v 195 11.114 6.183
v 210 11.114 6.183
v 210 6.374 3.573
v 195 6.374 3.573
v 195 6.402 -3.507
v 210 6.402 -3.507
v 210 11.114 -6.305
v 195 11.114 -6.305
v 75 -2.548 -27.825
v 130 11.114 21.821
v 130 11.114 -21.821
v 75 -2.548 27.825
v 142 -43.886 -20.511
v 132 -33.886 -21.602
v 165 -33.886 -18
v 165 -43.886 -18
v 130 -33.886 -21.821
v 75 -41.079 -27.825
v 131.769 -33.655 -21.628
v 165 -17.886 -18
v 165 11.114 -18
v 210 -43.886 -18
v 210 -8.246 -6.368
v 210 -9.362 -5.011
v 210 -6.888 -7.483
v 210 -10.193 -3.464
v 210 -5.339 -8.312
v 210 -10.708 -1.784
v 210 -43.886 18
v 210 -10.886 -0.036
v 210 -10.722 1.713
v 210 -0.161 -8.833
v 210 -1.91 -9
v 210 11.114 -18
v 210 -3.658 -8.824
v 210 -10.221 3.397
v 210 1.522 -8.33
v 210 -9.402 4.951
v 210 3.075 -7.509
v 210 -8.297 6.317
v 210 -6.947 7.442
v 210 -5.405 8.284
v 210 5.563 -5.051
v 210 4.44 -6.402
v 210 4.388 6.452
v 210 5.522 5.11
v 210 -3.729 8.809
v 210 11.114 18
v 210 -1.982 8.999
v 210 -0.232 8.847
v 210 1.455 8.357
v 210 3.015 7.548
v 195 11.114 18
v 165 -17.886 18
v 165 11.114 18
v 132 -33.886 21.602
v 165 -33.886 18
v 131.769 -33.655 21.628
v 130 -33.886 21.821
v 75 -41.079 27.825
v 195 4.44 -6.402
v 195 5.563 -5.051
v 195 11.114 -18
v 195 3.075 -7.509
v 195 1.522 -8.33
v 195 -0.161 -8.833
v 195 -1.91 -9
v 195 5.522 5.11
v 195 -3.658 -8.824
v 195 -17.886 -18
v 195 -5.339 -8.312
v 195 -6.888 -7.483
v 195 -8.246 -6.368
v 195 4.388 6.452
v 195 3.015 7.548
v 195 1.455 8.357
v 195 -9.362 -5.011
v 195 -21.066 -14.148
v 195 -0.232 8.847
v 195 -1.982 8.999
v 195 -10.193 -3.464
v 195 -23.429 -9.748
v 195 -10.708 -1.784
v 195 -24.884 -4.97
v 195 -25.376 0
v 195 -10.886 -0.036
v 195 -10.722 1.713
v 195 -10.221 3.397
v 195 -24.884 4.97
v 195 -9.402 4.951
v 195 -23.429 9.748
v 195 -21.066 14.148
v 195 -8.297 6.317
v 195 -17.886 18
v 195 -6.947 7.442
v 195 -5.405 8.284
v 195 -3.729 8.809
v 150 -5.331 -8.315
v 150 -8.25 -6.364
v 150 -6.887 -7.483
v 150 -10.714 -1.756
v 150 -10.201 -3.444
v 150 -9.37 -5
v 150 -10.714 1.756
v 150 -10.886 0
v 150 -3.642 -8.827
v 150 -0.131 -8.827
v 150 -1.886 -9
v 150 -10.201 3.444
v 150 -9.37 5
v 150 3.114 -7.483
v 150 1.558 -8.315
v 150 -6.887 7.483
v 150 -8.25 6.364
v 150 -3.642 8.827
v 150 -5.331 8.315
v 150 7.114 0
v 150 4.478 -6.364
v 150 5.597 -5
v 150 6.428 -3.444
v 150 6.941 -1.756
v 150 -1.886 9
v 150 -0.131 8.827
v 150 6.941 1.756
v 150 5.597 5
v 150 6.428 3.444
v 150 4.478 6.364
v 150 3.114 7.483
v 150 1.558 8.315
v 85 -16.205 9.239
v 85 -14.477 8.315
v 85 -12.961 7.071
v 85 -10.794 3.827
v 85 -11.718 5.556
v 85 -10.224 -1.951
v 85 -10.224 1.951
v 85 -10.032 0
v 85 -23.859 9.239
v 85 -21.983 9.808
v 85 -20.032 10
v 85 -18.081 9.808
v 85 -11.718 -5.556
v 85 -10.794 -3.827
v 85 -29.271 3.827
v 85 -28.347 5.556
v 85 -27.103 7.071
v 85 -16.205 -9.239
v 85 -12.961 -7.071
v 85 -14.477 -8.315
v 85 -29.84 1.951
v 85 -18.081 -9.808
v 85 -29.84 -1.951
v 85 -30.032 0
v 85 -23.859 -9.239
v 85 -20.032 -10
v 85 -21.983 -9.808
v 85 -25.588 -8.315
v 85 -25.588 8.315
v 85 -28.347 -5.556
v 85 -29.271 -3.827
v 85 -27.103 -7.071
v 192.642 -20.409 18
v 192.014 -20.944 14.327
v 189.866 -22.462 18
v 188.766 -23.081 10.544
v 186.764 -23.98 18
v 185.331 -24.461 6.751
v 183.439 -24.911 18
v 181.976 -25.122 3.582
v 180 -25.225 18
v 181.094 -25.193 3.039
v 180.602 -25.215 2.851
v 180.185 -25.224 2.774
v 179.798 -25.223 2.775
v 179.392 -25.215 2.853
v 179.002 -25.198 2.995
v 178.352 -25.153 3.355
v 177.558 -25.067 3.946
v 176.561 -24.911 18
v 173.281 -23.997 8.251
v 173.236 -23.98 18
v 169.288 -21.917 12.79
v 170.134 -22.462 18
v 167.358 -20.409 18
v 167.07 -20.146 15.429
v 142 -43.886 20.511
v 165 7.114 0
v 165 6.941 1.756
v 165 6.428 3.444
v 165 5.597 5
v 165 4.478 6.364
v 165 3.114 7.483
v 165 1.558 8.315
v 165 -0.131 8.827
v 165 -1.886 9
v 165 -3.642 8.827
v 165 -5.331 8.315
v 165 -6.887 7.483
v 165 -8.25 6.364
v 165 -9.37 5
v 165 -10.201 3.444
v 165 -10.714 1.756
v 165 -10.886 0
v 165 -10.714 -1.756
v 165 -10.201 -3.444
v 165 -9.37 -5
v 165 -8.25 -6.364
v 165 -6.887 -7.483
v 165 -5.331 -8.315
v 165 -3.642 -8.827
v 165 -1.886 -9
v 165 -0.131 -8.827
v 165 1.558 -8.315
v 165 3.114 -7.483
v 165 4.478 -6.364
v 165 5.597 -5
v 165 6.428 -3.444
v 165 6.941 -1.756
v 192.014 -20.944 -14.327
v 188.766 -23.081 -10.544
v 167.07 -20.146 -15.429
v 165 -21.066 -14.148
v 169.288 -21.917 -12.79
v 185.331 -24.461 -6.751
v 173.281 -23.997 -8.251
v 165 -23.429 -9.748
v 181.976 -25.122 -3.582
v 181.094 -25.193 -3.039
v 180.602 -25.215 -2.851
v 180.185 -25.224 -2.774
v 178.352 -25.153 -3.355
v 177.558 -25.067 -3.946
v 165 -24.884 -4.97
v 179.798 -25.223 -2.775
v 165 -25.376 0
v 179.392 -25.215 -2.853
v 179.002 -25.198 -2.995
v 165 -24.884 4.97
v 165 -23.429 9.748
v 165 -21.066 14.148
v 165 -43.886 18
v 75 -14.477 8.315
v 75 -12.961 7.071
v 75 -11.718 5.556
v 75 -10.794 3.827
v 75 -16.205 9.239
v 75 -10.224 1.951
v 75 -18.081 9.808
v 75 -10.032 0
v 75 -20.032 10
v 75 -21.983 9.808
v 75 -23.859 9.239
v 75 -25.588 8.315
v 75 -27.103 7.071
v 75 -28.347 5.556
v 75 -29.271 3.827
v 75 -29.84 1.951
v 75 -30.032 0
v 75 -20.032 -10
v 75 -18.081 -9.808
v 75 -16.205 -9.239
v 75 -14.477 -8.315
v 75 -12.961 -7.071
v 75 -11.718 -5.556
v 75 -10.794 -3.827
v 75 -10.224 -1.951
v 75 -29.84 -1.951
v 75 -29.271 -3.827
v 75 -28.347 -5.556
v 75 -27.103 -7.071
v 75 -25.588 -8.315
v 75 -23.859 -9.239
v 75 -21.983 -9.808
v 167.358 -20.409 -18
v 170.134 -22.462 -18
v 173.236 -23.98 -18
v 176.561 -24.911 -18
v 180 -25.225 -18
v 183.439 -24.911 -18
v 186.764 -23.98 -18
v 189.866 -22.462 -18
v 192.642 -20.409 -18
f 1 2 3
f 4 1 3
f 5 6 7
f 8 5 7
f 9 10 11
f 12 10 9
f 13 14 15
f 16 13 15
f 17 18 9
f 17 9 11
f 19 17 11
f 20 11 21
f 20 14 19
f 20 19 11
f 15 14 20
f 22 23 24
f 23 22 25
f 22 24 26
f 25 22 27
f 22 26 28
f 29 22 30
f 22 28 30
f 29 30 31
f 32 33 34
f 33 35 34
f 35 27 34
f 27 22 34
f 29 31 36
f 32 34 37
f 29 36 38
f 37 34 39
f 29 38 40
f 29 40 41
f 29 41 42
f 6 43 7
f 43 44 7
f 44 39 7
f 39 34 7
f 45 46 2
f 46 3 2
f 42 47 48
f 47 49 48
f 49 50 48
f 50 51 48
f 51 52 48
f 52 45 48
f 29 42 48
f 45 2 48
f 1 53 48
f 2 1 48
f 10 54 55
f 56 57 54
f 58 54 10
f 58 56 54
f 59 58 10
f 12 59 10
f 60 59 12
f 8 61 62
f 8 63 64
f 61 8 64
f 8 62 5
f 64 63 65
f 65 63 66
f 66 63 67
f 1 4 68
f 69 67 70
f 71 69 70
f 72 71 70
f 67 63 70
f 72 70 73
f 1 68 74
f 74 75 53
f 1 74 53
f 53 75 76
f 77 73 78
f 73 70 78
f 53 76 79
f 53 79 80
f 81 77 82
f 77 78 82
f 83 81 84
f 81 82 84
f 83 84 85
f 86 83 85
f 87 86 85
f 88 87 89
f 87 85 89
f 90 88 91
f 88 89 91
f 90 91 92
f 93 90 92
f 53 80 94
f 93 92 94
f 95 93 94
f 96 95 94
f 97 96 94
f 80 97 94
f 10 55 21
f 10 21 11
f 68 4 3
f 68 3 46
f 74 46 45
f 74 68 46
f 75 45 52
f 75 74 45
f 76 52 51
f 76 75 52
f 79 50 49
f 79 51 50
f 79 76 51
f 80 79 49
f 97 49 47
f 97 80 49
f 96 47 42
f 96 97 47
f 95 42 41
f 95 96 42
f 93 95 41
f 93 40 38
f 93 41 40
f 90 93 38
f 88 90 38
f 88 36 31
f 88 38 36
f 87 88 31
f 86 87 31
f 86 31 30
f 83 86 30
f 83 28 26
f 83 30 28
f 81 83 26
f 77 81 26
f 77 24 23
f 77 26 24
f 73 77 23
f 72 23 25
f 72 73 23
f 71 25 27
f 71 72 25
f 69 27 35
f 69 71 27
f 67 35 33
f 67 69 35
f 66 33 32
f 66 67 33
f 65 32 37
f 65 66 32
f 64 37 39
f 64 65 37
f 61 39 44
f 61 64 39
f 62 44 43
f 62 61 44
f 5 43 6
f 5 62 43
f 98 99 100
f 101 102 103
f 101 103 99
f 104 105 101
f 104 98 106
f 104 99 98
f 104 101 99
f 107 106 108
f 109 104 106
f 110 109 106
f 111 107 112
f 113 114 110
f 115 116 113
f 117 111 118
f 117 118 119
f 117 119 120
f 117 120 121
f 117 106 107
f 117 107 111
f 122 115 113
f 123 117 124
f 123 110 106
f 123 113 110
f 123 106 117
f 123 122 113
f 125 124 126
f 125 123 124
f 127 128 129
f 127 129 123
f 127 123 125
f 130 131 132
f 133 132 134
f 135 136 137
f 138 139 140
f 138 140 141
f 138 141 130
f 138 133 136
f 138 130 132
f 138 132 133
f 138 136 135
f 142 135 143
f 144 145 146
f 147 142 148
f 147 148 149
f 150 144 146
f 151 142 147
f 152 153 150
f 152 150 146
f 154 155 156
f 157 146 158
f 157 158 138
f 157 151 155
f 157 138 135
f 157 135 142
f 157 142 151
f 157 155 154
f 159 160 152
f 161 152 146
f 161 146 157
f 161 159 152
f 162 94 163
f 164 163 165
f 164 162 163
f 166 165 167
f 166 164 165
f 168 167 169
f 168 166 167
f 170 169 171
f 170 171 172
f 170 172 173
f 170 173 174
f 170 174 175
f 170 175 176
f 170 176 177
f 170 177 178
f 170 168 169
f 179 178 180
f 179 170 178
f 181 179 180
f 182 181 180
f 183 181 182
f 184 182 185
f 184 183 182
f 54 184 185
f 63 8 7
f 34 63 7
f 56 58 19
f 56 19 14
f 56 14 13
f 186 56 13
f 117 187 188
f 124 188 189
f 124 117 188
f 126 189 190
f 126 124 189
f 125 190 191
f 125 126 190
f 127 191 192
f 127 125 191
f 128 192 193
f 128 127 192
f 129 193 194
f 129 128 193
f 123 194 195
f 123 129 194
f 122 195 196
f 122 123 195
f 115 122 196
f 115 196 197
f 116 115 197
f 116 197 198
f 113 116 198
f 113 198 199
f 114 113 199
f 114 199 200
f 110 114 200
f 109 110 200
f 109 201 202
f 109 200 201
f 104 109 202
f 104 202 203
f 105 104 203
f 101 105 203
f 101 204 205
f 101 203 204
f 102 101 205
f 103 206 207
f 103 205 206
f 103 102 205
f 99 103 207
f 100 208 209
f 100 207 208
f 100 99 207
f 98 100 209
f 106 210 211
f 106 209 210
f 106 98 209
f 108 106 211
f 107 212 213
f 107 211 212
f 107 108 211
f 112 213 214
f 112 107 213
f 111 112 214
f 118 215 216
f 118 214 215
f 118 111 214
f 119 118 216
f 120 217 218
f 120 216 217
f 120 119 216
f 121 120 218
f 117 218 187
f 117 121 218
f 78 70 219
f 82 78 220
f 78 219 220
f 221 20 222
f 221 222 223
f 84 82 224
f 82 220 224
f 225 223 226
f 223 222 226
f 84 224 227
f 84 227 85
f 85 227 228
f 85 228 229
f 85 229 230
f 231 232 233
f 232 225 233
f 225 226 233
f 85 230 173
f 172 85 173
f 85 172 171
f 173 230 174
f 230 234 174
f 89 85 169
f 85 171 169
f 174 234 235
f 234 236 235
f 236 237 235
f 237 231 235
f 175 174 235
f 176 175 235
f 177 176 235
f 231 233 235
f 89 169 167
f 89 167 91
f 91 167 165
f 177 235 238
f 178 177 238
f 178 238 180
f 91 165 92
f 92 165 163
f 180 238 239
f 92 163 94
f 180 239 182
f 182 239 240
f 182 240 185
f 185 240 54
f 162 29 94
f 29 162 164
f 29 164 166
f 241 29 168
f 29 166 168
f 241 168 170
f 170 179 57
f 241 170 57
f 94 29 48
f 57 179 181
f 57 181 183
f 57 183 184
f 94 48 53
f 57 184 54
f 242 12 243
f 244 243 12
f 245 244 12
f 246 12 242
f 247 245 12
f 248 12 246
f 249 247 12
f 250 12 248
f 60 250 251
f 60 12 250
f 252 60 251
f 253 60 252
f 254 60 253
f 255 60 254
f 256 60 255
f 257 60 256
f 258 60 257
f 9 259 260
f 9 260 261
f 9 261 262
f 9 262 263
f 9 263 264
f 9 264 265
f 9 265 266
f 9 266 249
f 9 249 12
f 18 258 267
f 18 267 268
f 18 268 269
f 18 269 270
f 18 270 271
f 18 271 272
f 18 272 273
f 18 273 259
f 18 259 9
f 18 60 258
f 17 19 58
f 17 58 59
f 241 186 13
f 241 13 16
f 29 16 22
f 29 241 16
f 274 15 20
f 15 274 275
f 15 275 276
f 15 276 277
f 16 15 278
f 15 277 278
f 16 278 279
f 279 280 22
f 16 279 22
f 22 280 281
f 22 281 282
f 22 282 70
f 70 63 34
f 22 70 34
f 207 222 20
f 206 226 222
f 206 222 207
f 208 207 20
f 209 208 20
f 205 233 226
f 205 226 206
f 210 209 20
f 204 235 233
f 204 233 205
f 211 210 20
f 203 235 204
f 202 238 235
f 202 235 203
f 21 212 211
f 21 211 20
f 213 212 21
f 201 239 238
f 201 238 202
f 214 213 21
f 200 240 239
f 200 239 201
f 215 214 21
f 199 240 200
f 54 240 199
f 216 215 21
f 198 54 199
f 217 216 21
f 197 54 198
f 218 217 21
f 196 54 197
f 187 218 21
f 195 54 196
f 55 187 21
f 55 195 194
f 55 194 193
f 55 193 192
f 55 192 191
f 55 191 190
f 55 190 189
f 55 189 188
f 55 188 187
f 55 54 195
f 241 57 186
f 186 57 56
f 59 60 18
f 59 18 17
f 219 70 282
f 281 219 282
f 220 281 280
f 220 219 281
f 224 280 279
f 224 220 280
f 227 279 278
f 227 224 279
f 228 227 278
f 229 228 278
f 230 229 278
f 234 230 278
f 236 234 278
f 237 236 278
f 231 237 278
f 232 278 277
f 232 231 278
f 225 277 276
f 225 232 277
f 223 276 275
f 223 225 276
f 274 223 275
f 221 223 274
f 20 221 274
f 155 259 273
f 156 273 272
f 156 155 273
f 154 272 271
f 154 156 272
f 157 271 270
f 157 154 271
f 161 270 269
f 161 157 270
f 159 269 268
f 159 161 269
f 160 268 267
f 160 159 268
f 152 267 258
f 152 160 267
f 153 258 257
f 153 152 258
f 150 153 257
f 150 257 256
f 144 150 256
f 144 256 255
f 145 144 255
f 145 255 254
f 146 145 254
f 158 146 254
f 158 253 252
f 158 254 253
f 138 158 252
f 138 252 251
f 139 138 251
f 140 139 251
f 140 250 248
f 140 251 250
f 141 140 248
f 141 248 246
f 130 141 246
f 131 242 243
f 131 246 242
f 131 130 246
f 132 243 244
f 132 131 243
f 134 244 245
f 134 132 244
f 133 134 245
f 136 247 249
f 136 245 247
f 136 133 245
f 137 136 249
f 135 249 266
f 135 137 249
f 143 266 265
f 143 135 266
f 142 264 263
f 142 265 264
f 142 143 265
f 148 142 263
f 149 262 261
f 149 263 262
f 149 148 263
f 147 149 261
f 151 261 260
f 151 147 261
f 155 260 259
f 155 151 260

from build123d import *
from OCP.BRepAlgoAPI import BRepAlgoAPI_Cut
from OCP.TopTools import TopTools_ListOfShape

# Parameters (mm, degrees)
SKETCH1_R               = 10
BOSS_EXTRUDE2_DEPTH     = 30
SKETCH4_R               = 10
CUT_EXTRUDE1_DEPTH      = 15
CHAMFER1_SIZE           = 20
CUT_EXTRUDE2_DEPTH      = 174.638139858
CUT_EXTRUDE2_DEPTH_BACK = 174.638139858
BOSS_EXTRUDE3_DEPTH     = 45
CUT_EXTRUDE3_DEPTH      = 198.547978004
CUT_EXTRUDE3_DEPTH_BACK = 15
SKETCH6_3_R             = 9
SKETCH8_W               = 15
SKETCH8_H               = 36
BOSS_EXTRUDE4_DEPTH     = 45.000002
SKETCH10_R              = 9
CUT_EXTRUDE4_DEPTH      = 198.547978004
BOSS_EXTRUDE5_DEPTH     = 10
CHAMFER2_SIZE           = 12
CUT_EXTRUDE5_DEPTH      = 40
CUT_EXTRUDE6_DEPTH      = 217.852953896
CUT_EXTRUDE6_DEPTH_BACK = 217.852953896
SKETCH14_W              = 100
SKETCH14_H              = 60
CUT_EXTRUDE7_DEPTH      = 145.655593904
CUT_EXTRUDE7_DEPTH_BACK = 10
SKETCH16_R              = 10
CUT_EXTRUDE8_DEPTH      = 15


# Some blends are built 0.0001 mm under size
with BuildPart() as part:
    # Sketch1 → Boss-Extrude2 (new, symmetric)
    # profile 1 of 3: a face of its own
    with BuildSketch(Plane.XY):
        Polygon((25, -10), (-4.997737685, -45.002262315), (-25, -25), (-25, 25), (25, 25), align=None)
        Circle(SKETCH1_R, mode=Mode.SUBTRACT)
    # profile 2 of 3: a face of its own
    with BuildSketch(Plane.XY):
        Polygon((45, -10), (25, -10), (-4.997737685, -45.002262315), (45.002262315, -45.002262315), (75, -41.079226753), (75, -2.548159698), align=None)
    # profile 3 of 3: a face of its own
    with BuildSketch(Plane.XY):
        Polygon((130, 11.113547523), (75, -2.548159698), (75, -41.079226753), (130, -33.886452477), (165, -33.886452477), (165, 11.113547523), align=None)
    extrude(amount=BOSS_EXTRUDE2_DEPTH, both=True)

    # Sketch4 → Cut-Extrude1 (cut, symmetric)
    with BuildSketch(Plane.XY):
        Polygon((25, -10), (-4.997737685, -45.002262315), (-25, -25), (-25, 25), (25, 25), align=None)
        Circle(SKETCH4_R, mode=Mode.SUBTRACT)
    extrude(amount=CUT_EXTRUDE1_DEPTH, both=True, mode=Mode.SUBTRACT)

    # Chamfer1
    chamfer1_edges = [part.edges().sort_by_distance(p)[0] for p in [
        (25, -10, -22.5),
        (25, -10, 22.5),
    ]]
    chamfer(chamfer1_edges, length=CHAMFER1_SIZE - 0.0001)  # a hair under: the kernel refuses the full size

    # Sketch5 → Cut-Extrude2 (cut, two sides: drawn at the far end of the back side and taken through both)
    with BuildSketch(Plane(origin=(0, 0, 0), x_dir=(1, 0, 0), z_dir=(0, 1, 0)).offset(-CUT_EXTRUDE2_DEPTH_BACK)):
        Polygon((165, -30), (165, -18), (55.074227224, -30), align=None)
        Polygon((165, 18), (165, 30), (55.074227224, 30), align=None)
    extrude(amount=CUT_EXTRUDE2_DEPTH + CUT_EXTRUDE2_DEPTH_BACK, mode=Mode.SUBTRACT)

    # Sketch6 → Boss-Extrude3 (add)
    with BuildSketch(Plane(origin=(165, 0, 0), x_dir=(0, 0, -1), z_dir=(1, 0, 0))):
        with BuildLine():
            Line((-18, -33.886452477), (18, -33.886452477))
            Line((18, -33.886452477), (18, -17.886452477))
            ThreePointArc((18, -17.886452477), (0, -25.375680921), (-18, -17.886452477))
            Line((-18, -17.886452477), (-18, -33.886452477))
        make_face()
    extrude(amount=BOSS_EXTRUDE3_DEPTH)

    # Sketch6<3> → Cut-Extrude3 (cut, two sides: drawn at the far end of the back side and taken through both)
    with BuildSketch(Plane(origin=(165, 0, 0), x_dir=(0, 0, -1), z_dir=(1, 0, 0)).offset(-CUT_EXTRUDE3_DEPTH_BACK)):
        with Locations(Location((0, -1.886452477, 0), (0, 0, 90))):
            Circle(SKETCH6_3_R)
    extrude(amount=CUT_EXTRUDE3_DEPTH + CUT_EXTRUDE3_DEPTH_BACK, mode=Mode.SUBTRACT)

    # Sketch8 → Boss-Extrude4 (add)
    with BuildSketch(Plane.XZ.offset(33.886452477)):
        with Locations((202.5, 0)):
            Rectangle(SKETCH8_W, SKETCH8_H)
    extrude(amount=-BOSS_EXTRUDE4_DEPTH)

    # Sketch10 → Cut-Extrude4 (cut, through all)
    with BuildSketch(Plane(origin=(165, 0, 0), x_dir=(0, 0, -1), z_dir=(1, 0, 0))):
        with Locations(Location((0, -1.886452477, 0), (0, 0, 90))):
            Circle(SKETCH10_R)
    extrude(amount=CUT_EXTRUDE4_DEPTH, mode=Mode.SUBTRACT)

    # Sketch11 → Boss-Extrude5 (add)
    with BuildSketch(Plane.XZ.offset(33.886452477)):
        Polygon((130, 21.82076004), (130, -21.82076004), (165, -18), (210, -18), (210, 18), (165, 18), align=None)
    extrude(amount=BOSS_EXTRUDE5_DEPTH)

    # Chamfer2
    # the kernel refuses this chamfer: 12 mm, written as the material it takes off along each edge
    with BuildSketch(Plane(origin=(130, -43.886452477, 52.680955896), x_dir=(0, 1, 0), z_dir=(0, 0, -1))) as chamfer2_piece_1_section:
        Polygon((CHAMFER2_SIZE, 0), (0, CHAMFER2_SIZE), (0, 0), align=None)
    chamfer2_piece_1 = extrude(amount=105.361911791, mode=Mode.PRIVATE)
    chamfer2_piece_1 = split(chamfer2_piece_1, bisect_by=Plane(origin=(128.714213423, -34.054604706, 52.680955896), z_dir=(0.1296735244167249, -0.9915567442488328, 0)), keep=Keep.TOP, mode=Mode.PRIVATE)
    add(chamfer2_piece_1, mode=Mode.SUBTRACT)

    # Sketch13 → Cut-Extrude5 (cut)
    with BuildSketch(Plane.XY.offset(18)):
        with BuildLine():
            Line((165, -17.886452477), (195, -17.886452477))
            ThreePointArc((195, -17.886452477), (180, -25.224548687), (165, -17.886452477))
        make_face()
    extrude(amount=-CUT_EXTRUDE5_DEPTH, mode=Mode.SUBTRACT)

    # Sketch14 → Cut-Extrude6 (cut, two sides: drawn at the far end of the back side and taken through both)
    with BuildSketch(Plane(origin=(0, 0, 0), x_dir=(1, 0, 0), z_dir=(0, 1, 0)).offset(-CUT_EXTRUDE6_DEPTH_BACK)):
        with Locations((25, 0)):
            Rectangle(SKETCH14_W, SKETCH14_H)
    extrude(amount=CUT_EXTRUDE6_DEPTH + CUT_EXTRUDE6_DEPTH_BACK, mode=Mode.SUBTRACT)

    # Sketch16 → Cut-Extrude7 (cut, two sides: drawn at the far end of the back side and taken through both)
    with BuildSketch(Plane.ZY.offset(-75).offset(-CUT_EXTRUDE7_DEPTH_BACK)):
        with Locations(Location((0, -20.03233432, 0), (0, 0, 180))):
            Circle(SKETCH16_R)
    extrude(amount=CUT_EXTRUDE7_DEPTH + CUT_EXTRUDE7_DEPTH_BACK, mode=Mode.SUBTRACT)


with BuildPart() as cut_extrude8_tool:
    # Sketch17 → Cut-Extrude8 (new body)
    with BuildSketch(Plane(origin=(210, 0, 0), x_dir=(0, 0, -1), z_dir=(1, 0, 0))):
        with BuildLine():
            Line((-6.182771984, 11.113547523), (-3.573497387, 6.373699848))
            ThreePointArc((-3.573497387, 6.373699848), (-0.036026842, 7.113475415), (3.507252904, 6.402044194))
            Line((3.507252904, 6.402044194), (6.304774933, 11.113547523))
            Line((6.304774933, 11.113547523), (-6.182771984, 11.113547523))
        make_face()
    extrude(amount=-CUT_EXTRUDE8_DEPTH)


with BuildPart() as part_1:
    add(part.part)

    # Cut-Extrude8: cut by cut_extrude8_tool, with a tolerance
    cut_extrude8_stock = TopTools_ListOfShape()
    cut_extrude8_stock.Append(part_1.part.wrapped)
    cut_extrude8_tools = TopTools_ListOfShape()
    cut_extrude8_tools.Append(cut_extrude8_tool.part.wrapped)
    cut_extrude8_cut = BRepAlgoAPI_Cut()
    cut_extrude8_cut.SetArguments(cut_extrude8_stock)
    cut_extrude8_cut.SetTools(cut_extrude8_tools)
    cut_extrude8_cut.SetFuzzyValue(0.00001)
    cut_extrude8_cut.Build()
    add(Compound.cast(cut_extrude8_cut.Shape()).solids(), mode=Mode.REPLACE)


solid = part_1.part
